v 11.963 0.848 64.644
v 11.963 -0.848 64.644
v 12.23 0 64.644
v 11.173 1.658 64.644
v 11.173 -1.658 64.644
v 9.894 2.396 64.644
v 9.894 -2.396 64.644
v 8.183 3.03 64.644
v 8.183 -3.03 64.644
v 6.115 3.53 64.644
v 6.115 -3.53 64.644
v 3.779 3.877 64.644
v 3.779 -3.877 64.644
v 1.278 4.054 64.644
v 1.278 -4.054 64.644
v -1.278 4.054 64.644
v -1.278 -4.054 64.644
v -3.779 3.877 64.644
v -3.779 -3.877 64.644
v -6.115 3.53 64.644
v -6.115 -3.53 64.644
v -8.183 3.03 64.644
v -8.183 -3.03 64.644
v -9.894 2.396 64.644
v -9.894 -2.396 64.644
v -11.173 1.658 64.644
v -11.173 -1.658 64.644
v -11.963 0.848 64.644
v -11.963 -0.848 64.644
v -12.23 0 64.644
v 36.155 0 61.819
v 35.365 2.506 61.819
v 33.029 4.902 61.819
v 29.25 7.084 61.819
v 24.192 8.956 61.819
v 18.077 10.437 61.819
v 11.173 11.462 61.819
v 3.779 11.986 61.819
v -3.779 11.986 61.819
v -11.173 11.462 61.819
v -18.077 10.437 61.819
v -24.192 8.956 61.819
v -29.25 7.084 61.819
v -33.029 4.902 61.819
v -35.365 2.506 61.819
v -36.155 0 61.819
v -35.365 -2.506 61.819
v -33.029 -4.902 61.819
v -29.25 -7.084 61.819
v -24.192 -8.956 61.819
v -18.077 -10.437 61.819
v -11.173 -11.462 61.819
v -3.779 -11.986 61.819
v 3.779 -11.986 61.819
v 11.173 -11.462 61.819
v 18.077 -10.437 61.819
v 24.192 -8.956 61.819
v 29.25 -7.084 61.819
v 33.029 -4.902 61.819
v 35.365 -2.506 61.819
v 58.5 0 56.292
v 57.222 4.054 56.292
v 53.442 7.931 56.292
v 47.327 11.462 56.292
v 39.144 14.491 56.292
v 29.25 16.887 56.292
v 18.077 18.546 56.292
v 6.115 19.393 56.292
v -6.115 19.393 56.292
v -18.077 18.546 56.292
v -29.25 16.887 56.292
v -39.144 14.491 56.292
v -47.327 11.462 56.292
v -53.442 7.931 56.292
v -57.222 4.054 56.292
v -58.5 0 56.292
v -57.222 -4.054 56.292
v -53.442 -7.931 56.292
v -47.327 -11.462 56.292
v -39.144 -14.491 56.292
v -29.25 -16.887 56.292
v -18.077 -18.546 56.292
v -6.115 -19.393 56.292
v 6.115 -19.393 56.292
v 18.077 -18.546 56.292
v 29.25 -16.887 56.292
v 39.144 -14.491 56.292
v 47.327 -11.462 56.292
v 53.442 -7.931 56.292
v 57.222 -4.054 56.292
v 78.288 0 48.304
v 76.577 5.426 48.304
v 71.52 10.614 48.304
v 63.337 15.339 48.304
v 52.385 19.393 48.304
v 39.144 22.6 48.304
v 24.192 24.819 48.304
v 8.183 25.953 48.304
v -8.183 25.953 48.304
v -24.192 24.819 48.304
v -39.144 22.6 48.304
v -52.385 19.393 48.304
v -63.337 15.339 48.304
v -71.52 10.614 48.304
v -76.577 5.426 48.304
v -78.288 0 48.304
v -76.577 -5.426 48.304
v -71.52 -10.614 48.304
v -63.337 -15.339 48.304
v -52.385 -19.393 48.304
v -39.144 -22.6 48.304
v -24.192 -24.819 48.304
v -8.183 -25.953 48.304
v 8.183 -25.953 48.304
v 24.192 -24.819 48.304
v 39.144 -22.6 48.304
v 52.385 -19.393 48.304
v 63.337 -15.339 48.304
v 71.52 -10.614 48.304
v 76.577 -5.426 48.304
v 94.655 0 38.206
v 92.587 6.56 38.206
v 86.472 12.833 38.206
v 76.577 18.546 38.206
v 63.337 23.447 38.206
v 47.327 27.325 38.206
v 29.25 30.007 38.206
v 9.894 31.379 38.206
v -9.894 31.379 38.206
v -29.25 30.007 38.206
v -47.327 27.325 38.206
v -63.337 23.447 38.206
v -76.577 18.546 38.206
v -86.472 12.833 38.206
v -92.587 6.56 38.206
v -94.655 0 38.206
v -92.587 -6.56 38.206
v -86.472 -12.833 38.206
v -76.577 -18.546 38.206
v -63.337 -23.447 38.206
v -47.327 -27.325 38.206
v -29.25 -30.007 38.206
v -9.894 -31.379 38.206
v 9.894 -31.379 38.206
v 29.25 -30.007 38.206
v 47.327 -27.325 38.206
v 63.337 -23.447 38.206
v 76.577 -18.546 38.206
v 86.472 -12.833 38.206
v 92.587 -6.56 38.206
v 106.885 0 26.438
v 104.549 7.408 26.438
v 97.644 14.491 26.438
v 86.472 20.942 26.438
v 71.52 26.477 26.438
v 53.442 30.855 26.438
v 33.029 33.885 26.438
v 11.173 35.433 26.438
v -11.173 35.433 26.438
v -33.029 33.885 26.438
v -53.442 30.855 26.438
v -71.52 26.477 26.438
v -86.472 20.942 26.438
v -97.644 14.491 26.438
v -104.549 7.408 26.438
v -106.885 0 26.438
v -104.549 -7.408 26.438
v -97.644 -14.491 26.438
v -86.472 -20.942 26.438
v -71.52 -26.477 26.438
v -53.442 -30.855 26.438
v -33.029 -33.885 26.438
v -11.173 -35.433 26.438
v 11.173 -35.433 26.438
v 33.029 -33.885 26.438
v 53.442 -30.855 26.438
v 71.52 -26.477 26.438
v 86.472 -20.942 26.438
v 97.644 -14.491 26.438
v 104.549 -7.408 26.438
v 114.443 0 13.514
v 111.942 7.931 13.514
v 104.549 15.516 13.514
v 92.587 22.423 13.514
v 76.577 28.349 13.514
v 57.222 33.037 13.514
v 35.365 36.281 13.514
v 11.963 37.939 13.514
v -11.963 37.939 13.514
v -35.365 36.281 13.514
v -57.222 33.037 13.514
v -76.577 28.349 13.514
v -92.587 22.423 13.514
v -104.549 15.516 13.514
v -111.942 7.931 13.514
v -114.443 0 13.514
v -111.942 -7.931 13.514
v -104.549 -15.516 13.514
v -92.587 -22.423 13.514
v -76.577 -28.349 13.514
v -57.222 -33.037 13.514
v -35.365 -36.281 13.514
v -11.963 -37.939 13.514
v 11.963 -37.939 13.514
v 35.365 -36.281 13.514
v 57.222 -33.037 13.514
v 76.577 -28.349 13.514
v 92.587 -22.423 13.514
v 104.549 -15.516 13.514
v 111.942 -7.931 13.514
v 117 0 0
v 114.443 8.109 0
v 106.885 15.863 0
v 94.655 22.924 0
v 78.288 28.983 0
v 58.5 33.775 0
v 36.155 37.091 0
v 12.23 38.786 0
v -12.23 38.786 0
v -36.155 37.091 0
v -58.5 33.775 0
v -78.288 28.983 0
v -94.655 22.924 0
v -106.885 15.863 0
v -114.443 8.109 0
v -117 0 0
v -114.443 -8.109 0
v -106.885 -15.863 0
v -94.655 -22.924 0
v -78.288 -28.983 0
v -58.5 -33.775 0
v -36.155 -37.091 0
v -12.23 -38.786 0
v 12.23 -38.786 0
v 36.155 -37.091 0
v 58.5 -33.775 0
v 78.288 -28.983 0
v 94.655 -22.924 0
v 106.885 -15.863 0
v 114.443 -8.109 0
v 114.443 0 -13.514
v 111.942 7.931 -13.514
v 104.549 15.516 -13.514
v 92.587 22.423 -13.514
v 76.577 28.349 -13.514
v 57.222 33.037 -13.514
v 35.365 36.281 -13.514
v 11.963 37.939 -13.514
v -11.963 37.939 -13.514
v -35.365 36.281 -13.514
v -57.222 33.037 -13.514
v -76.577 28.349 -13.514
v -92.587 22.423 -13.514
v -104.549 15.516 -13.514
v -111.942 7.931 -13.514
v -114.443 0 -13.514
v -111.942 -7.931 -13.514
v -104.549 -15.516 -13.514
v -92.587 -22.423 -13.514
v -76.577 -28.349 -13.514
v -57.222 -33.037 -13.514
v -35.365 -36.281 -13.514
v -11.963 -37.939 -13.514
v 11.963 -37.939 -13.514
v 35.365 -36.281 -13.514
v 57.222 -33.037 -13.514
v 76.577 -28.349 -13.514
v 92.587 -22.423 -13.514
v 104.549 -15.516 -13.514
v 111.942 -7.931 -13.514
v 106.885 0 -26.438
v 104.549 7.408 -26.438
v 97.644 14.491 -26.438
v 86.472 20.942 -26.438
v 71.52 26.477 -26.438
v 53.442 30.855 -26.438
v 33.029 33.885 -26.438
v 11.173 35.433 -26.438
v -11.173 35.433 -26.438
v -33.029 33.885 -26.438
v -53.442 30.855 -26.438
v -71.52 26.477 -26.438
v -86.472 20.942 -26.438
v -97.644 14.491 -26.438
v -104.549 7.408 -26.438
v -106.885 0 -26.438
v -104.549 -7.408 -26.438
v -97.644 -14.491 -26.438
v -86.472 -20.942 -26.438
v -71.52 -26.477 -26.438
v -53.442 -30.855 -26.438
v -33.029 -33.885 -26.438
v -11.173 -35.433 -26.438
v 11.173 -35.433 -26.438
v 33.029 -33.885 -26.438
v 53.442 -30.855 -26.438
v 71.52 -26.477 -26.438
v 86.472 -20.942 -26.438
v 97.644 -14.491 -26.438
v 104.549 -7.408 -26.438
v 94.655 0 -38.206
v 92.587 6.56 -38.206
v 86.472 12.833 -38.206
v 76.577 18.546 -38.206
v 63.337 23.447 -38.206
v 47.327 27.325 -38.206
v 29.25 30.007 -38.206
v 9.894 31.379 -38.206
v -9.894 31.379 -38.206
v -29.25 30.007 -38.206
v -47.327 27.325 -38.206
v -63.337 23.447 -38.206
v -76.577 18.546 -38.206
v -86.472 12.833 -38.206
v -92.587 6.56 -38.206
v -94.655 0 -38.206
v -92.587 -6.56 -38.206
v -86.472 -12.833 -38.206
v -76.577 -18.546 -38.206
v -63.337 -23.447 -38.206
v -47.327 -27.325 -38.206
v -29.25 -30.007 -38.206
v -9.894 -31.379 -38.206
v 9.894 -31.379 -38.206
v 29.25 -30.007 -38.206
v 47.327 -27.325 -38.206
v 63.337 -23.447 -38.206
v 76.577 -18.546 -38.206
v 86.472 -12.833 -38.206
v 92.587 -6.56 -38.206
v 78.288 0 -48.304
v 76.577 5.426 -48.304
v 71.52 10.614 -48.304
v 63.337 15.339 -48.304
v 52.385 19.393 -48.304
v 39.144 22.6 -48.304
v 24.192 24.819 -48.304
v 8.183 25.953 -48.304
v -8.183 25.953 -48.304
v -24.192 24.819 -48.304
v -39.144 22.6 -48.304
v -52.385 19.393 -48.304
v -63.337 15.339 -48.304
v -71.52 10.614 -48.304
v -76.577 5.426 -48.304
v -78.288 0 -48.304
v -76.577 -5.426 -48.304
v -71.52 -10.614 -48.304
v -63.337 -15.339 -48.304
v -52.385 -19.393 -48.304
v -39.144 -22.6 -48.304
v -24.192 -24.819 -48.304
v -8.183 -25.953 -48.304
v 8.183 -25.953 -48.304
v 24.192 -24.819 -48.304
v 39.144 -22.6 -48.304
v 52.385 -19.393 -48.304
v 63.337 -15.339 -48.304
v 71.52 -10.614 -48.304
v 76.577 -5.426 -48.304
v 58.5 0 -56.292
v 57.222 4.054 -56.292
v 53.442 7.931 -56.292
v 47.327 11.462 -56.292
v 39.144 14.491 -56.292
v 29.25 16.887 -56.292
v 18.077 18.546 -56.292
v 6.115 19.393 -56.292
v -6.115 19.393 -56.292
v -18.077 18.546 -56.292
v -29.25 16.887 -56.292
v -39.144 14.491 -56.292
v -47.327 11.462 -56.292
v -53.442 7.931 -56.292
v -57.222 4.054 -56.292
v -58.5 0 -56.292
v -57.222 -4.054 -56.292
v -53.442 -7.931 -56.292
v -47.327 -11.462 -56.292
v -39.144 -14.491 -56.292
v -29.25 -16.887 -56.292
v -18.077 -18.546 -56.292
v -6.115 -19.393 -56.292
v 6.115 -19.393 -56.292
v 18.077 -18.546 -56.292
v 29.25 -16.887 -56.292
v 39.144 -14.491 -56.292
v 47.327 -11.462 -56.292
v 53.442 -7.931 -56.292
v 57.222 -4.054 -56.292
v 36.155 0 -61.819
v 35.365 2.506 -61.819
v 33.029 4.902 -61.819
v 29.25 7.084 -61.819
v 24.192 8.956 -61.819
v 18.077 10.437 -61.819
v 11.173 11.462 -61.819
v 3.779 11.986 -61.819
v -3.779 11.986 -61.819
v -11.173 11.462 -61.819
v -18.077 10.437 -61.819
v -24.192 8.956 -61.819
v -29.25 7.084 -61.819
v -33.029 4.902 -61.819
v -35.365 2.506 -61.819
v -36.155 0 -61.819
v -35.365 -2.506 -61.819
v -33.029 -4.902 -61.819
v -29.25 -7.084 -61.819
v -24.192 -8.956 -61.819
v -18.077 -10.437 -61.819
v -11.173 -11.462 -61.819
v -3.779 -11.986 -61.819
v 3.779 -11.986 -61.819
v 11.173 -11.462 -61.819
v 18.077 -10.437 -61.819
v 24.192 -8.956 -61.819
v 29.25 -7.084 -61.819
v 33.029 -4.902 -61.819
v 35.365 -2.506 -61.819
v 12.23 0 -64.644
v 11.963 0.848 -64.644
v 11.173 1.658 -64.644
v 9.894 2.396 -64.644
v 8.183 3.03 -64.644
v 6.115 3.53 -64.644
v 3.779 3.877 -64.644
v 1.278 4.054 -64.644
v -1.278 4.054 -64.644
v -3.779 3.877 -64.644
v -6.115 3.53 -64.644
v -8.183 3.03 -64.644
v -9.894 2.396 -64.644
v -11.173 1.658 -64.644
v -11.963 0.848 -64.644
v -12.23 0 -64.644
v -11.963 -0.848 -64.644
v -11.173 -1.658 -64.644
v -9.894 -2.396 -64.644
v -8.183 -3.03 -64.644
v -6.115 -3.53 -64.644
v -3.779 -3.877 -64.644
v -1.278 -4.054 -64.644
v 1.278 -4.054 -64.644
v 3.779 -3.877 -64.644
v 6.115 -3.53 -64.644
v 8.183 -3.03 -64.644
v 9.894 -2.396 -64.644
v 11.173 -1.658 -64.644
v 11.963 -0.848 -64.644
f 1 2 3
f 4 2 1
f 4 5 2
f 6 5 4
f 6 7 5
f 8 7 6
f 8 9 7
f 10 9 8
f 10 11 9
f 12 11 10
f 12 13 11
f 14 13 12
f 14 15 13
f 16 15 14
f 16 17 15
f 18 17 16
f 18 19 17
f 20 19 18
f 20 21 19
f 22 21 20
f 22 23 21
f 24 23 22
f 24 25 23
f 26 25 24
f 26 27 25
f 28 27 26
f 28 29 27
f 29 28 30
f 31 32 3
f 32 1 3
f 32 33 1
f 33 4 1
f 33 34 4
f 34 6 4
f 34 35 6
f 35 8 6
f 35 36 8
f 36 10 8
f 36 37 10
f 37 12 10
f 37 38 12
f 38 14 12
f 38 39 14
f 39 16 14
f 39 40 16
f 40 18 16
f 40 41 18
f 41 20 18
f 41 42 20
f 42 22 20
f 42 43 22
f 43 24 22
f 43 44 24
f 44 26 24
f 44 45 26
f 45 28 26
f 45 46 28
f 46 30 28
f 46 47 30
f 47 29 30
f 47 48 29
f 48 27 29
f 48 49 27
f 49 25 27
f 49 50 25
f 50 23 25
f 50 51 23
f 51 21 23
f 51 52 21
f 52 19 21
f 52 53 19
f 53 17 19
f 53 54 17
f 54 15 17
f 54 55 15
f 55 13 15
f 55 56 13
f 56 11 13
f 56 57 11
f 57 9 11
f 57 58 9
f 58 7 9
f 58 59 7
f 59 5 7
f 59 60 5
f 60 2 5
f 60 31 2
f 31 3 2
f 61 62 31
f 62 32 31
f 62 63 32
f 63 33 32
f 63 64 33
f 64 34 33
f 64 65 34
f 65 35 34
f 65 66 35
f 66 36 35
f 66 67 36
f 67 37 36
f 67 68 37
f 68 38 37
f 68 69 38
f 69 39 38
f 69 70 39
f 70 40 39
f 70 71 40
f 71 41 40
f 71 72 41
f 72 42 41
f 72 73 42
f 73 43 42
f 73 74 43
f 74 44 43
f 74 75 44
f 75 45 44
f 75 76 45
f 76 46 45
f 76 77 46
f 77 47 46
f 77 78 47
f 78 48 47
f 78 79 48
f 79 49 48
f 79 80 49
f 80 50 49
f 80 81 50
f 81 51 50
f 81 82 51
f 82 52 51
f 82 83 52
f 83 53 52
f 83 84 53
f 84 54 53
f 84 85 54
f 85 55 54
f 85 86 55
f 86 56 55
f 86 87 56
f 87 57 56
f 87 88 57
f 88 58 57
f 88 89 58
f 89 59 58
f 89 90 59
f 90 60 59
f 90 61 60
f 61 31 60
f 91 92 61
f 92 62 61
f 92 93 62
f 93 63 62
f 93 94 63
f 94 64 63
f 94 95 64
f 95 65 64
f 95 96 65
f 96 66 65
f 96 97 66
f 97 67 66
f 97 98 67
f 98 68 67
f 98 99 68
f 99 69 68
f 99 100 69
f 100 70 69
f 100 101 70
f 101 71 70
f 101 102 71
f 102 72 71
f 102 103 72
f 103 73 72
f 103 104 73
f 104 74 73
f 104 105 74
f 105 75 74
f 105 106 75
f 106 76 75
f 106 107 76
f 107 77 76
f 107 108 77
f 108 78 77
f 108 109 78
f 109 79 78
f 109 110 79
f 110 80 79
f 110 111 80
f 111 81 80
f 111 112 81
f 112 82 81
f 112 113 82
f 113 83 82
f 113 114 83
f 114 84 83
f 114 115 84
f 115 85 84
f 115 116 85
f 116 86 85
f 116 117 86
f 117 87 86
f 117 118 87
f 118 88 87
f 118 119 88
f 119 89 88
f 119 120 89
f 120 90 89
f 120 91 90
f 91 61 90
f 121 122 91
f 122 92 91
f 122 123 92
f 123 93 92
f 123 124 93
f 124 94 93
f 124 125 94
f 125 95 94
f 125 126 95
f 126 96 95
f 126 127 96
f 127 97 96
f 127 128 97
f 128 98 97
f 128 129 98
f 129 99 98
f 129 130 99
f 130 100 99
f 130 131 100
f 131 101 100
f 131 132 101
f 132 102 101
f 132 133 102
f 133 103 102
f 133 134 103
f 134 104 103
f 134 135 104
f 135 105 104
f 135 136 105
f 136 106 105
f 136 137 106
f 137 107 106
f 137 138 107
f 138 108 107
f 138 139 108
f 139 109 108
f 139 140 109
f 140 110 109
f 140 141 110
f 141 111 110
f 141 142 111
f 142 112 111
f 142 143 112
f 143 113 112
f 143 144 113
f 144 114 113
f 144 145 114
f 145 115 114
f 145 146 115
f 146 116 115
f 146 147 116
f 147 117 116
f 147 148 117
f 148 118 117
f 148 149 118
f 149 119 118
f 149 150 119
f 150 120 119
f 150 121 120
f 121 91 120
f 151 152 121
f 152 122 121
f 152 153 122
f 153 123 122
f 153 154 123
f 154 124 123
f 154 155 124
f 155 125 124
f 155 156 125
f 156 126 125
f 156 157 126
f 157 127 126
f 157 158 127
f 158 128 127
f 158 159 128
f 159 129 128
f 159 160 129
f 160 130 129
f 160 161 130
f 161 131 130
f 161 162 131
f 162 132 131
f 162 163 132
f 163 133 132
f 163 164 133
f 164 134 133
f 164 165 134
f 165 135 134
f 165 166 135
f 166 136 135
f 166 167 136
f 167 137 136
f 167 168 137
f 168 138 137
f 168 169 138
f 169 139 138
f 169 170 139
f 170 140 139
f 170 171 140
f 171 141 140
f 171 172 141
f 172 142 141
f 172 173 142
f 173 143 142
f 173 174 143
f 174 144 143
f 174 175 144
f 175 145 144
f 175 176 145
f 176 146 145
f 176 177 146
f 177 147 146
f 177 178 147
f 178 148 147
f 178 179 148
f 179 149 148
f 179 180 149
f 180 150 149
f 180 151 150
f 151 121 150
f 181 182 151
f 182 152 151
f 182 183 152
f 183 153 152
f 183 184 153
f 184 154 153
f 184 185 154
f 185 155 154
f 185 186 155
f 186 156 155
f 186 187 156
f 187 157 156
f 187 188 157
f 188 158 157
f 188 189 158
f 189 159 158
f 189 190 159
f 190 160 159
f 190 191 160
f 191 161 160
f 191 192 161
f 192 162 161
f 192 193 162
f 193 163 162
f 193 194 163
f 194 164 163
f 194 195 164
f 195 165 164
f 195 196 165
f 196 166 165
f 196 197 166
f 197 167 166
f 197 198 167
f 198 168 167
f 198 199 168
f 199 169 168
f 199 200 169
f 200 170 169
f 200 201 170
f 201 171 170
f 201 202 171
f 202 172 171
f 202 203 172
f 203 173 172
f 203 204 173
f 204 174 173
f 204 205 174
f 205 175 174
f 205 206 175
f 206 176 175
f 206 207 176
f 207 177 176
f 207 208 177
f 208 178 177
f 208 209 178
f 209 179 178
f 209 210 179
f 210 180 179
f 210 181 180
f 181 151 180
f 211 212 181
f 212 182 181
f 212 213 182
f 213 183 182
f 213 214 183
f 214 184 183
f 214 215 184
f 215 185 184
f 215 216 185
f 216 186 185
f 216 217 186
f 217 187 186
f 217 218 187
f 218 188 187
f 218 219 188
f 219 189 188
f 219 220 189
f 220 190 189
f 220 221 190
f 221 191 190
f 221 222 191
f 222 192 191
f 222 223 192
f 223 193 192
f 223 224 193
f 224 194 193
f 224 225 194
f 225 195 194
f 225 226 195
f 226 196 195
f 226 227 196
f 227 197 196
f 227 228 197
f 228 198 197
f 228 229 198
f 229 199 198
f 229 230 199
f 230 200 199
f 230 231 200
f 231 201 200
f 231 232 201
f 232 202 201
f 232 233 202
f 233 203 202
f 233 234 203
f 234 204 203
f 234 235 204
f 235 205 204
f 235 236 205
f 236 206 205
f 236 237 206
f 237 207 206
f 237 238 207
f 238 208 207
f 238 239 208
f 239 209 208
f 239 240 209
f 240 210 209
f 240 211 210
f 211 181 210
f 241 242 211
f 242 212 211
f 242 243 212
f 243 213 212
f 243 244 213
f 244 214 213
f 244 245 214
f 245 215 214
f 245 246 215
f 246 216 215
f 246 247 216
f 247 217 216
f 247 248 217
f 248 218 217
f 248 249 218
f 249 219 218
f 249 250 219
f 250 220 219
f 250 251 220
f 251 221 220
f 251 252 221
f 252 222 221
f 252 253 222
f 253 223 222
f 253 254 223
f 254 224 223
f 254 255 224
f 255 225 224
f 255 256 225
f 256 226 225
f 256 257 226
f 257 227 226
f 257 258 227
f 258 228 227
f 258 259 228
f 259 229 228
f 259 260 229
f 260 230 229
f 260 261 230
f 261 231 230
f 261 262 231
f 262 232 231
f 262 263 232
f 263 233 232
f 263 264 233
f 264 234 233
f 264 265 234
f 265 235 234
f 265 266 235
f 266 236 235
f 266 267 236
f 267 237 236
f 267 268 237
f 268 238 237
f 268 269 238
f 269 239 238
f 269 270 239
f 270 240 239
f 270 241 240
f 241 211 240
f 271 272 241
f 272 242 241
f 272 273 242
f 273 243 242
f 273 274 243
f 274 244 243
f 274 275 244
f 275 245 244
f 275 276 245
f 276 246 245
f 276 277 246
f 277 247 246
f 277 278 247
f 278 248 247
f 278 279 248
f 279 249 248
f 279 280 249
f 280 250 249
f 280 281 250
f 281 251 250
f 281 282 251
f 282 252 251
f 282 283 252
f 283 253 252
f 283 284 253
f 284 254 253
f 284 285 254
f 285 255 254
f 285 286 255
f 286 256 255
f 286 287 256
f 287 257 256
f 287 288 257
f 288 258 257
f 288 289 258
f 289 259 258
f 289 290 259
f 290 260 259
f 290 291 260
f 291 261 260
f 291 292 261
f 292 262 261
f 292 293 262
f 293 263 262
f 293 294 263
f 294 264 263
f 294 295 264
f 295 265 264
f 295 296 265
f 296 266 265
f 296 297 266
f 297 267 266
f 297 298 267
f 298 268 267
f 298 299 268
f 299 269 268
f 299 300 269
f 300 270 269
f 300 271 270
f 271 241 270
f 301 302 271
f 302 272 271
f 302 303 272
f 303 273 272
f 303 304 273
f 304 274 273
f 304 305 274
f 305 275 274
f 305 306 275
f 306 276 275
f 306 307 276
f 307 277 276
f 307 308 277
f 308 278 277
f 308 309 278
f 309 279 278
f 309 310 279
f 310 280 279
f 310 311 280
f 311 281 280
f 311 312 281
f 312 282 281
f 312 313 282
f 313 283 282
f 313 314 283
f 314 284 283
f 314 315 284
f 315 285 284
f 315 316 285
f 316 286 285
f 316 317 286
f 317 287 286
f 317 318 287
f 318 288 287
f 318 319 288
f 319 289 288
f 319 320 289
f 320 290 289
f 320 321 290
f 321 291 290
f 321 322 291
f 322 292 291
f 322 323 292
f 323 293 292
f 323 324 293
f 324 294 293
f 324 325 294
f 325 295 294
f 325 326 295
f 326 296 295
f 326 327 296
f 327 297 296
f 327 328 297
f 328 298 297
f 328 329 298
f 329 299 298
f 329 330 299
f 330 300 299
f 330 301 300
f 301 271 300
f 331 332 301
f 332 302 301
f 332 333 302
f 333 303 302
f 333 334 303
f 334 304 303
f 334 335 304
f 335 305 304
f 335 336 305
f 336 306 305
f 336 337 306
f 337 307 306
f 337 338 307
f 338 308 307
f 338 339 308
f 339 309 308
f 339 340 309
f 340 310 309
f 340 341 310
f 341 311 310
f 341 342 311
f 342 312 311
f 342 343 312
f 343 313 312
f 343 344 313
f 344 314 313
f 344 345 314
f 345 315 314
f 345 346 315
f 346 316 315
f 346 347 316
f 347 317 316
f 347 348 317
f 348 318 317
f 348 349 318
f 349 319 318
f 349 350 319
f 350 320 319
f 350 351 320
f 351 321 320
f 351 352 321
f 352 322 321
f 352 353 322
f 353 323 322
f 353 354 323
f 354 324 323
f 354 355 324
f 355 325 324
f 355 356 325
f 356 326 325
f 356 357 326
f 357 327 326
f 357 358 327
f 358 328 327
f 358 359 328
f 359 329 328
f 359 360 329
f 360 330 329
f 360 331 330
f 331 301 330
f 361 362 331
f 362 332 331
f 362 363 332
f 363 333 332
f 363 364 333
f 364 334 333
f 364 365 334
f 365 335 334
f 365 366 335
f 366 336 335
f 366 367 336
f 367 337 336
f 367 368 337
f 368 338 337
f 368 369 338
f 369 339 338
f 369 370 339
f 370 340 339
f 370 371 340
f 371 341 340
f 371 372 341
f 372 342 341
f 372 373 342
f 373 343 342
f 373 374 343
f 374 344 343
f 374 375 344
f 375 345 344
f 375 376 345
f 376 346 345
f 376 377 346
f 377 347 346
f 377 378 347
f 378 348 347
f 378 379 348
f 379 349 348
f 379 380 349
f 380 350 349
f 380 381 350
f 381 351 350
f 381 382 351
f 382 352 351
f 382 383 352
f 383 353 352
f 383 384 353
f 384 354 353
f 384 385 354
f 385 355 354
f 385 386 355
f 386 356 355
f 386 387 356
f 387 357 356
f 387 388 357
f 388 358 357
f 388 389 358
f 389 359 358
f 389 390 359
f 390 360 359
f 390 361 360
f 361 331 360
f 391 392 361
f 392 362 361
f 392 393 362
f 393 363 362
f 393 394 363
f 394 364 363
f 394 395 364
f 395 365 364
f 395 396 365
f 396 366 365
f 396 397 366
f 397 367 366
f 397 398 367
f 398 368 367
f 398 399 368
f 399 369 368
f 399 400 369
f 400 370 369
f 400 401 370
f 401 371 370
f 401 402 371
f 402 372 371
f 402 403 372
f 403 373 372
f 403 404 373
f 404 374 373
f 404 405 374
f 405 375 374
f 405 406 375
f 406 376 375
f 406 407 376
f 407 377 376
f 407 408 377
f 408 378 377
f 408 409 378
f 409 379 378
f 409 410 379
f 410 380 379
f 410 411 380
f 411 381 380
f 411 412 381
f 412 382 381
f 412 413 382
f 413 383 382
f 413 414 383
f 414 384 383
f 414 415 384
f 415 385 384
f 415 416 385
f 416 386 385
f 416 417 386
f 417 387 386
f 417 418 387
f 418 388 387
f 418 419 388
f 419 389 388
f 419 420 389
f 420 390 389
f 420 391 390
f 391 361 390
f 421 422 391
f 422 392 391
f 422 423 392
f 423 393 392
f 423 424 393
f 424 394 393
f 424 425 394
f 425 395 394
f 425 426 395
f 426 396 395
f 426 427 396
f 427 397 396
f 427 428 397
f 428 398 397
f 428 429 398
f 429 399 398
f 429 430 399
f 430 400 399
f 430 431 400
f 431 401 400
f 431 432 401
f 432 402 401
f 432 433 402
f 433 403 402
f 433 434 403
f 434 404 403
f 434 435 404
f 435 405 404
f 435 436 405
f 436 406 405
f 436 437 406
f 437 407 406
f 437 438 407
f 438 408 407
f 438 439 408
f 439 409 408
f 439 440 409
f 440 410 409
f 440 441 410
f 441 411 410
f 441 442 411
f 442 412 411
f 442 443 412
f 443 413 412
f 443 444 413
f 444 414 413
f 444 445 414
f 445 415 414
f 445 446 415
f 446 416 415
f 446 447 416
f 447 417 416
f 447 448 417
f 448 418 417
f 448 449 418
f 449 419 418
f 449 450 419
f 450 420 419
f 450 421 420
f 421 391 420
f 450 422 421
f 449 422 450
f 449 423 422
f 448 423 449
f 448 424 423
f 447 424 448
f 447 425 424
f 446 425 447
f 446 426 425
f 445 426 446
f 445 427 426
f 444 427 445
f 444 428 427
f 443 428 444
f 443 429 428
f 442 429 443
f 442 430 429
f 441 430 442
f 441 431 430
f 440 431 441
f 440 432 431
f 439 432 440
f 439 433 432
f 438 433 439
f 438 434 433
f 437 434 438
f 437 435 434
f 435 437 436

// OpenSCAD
// Generated by SolidPython 1.0.1 on 2020-07-29 00:46:48


scale(v = [9, 3, 5]) {
	sphere(r = 13);
}
/***********************************************
*********      SolidPython code:      **********
************************************************
 
# import packages: SolidPython
from solid import *
from solid.utils import *
from itertools import chain, combinations, permutations


class Resize:

    def __init__(self, scad_file):
        self.scad_file = scad_file
        #self.scad_file = import_scad(scad_file)
        # cone/cylinder param:
        self.r1 = 0
        self.r2 = 0
        self.h = 0
        # rectangular prism param:
        self.w = 0
        self.l = 0
        # ellipse param:
        self.r = 0

    # import OpenScad code (file name corresponds to shape)


    # classify shape + parameters
    def assign(self, param1, param2, param3):
        if self.scad_file == 'cone.scad':
            self.r1 = param1
            self.r2 = param2
            self.h = param3
        elif self.scad_file == 'cylinder.scad':
            self.r1 = param1
            self.r2 = param2
            self.h = param3
        elif self.scad_file == 'rectangularPrism.scad':
            self.h = param1
            self.l = param2
            self.w = param3
        else:
            self.r = param1
            self.h = param2

    # resize parameters
    def iterate(self):
        x = range(3, 20, 2)
        i = 1
        if self.scad_file == 'cone.scad':
            tempList = list(permutations(x, 2))
            for temp in tempList:
                param1 = temp[0]
                param2 = temp[1]
                filepath = 'produced_scad_files/' + 'cone' + str(param1) + '_' + str(param2) + '_' + '.scad'
                scad_render_to_file(cylinder(h=param1, r1=param2, r2=0), filepath)

        elif self.scad_file == 'cylinder.scad':
            tempList = list(permutations(x, 3))
            for temp in tempList:
                param1 = temp[0]
                param2 = temp[1]
                filepath = 'produced_scad_files/' + 'cylinder' + str(param1) + '_' + str(param2) + '_' + '.scad'
                scad_render_to_file(cylinder(h=param1, r1=param2, r2=param2), filepath)

        elif self.scad_file == 'rectangularPrism.scad':
            tempList = list(permutations(x, 3))
            for temp in tempList:
                param1 = temp[0]
                param2 = temp[1]
                param3 = temp[2]
                filepath = 'produced_scad_files/' + 'rectangularPrism' + str(param1) + '_' + str(param2) + '_' + str(
                    param3) + '.scad'
                scad_render_to_file(cube(size=(param1, param2, param3)), filepath)

        elif self.scad_file == 'ellipse.scad':
            tempList = list(permutations(x, 4))
            for temp in tempList:
                param1 = temp[0]
                param2 = temp[1]
                param3 = temp[2]
                param4 = temp[3]
                filepath = 'produced_scad_files/' + 'ellipse' + str(param1) + '_' + str(param2) + '_' + str(param3) + '_' + str(param4) + '.scad'
                scad_render_to_file(scale([param1, param2, param3])(sphere(r=param4)), filepath)

    def render_to_scadfile(self):
        scad_render_to_file(scad, 'example.scad') 
 
************************************************/
